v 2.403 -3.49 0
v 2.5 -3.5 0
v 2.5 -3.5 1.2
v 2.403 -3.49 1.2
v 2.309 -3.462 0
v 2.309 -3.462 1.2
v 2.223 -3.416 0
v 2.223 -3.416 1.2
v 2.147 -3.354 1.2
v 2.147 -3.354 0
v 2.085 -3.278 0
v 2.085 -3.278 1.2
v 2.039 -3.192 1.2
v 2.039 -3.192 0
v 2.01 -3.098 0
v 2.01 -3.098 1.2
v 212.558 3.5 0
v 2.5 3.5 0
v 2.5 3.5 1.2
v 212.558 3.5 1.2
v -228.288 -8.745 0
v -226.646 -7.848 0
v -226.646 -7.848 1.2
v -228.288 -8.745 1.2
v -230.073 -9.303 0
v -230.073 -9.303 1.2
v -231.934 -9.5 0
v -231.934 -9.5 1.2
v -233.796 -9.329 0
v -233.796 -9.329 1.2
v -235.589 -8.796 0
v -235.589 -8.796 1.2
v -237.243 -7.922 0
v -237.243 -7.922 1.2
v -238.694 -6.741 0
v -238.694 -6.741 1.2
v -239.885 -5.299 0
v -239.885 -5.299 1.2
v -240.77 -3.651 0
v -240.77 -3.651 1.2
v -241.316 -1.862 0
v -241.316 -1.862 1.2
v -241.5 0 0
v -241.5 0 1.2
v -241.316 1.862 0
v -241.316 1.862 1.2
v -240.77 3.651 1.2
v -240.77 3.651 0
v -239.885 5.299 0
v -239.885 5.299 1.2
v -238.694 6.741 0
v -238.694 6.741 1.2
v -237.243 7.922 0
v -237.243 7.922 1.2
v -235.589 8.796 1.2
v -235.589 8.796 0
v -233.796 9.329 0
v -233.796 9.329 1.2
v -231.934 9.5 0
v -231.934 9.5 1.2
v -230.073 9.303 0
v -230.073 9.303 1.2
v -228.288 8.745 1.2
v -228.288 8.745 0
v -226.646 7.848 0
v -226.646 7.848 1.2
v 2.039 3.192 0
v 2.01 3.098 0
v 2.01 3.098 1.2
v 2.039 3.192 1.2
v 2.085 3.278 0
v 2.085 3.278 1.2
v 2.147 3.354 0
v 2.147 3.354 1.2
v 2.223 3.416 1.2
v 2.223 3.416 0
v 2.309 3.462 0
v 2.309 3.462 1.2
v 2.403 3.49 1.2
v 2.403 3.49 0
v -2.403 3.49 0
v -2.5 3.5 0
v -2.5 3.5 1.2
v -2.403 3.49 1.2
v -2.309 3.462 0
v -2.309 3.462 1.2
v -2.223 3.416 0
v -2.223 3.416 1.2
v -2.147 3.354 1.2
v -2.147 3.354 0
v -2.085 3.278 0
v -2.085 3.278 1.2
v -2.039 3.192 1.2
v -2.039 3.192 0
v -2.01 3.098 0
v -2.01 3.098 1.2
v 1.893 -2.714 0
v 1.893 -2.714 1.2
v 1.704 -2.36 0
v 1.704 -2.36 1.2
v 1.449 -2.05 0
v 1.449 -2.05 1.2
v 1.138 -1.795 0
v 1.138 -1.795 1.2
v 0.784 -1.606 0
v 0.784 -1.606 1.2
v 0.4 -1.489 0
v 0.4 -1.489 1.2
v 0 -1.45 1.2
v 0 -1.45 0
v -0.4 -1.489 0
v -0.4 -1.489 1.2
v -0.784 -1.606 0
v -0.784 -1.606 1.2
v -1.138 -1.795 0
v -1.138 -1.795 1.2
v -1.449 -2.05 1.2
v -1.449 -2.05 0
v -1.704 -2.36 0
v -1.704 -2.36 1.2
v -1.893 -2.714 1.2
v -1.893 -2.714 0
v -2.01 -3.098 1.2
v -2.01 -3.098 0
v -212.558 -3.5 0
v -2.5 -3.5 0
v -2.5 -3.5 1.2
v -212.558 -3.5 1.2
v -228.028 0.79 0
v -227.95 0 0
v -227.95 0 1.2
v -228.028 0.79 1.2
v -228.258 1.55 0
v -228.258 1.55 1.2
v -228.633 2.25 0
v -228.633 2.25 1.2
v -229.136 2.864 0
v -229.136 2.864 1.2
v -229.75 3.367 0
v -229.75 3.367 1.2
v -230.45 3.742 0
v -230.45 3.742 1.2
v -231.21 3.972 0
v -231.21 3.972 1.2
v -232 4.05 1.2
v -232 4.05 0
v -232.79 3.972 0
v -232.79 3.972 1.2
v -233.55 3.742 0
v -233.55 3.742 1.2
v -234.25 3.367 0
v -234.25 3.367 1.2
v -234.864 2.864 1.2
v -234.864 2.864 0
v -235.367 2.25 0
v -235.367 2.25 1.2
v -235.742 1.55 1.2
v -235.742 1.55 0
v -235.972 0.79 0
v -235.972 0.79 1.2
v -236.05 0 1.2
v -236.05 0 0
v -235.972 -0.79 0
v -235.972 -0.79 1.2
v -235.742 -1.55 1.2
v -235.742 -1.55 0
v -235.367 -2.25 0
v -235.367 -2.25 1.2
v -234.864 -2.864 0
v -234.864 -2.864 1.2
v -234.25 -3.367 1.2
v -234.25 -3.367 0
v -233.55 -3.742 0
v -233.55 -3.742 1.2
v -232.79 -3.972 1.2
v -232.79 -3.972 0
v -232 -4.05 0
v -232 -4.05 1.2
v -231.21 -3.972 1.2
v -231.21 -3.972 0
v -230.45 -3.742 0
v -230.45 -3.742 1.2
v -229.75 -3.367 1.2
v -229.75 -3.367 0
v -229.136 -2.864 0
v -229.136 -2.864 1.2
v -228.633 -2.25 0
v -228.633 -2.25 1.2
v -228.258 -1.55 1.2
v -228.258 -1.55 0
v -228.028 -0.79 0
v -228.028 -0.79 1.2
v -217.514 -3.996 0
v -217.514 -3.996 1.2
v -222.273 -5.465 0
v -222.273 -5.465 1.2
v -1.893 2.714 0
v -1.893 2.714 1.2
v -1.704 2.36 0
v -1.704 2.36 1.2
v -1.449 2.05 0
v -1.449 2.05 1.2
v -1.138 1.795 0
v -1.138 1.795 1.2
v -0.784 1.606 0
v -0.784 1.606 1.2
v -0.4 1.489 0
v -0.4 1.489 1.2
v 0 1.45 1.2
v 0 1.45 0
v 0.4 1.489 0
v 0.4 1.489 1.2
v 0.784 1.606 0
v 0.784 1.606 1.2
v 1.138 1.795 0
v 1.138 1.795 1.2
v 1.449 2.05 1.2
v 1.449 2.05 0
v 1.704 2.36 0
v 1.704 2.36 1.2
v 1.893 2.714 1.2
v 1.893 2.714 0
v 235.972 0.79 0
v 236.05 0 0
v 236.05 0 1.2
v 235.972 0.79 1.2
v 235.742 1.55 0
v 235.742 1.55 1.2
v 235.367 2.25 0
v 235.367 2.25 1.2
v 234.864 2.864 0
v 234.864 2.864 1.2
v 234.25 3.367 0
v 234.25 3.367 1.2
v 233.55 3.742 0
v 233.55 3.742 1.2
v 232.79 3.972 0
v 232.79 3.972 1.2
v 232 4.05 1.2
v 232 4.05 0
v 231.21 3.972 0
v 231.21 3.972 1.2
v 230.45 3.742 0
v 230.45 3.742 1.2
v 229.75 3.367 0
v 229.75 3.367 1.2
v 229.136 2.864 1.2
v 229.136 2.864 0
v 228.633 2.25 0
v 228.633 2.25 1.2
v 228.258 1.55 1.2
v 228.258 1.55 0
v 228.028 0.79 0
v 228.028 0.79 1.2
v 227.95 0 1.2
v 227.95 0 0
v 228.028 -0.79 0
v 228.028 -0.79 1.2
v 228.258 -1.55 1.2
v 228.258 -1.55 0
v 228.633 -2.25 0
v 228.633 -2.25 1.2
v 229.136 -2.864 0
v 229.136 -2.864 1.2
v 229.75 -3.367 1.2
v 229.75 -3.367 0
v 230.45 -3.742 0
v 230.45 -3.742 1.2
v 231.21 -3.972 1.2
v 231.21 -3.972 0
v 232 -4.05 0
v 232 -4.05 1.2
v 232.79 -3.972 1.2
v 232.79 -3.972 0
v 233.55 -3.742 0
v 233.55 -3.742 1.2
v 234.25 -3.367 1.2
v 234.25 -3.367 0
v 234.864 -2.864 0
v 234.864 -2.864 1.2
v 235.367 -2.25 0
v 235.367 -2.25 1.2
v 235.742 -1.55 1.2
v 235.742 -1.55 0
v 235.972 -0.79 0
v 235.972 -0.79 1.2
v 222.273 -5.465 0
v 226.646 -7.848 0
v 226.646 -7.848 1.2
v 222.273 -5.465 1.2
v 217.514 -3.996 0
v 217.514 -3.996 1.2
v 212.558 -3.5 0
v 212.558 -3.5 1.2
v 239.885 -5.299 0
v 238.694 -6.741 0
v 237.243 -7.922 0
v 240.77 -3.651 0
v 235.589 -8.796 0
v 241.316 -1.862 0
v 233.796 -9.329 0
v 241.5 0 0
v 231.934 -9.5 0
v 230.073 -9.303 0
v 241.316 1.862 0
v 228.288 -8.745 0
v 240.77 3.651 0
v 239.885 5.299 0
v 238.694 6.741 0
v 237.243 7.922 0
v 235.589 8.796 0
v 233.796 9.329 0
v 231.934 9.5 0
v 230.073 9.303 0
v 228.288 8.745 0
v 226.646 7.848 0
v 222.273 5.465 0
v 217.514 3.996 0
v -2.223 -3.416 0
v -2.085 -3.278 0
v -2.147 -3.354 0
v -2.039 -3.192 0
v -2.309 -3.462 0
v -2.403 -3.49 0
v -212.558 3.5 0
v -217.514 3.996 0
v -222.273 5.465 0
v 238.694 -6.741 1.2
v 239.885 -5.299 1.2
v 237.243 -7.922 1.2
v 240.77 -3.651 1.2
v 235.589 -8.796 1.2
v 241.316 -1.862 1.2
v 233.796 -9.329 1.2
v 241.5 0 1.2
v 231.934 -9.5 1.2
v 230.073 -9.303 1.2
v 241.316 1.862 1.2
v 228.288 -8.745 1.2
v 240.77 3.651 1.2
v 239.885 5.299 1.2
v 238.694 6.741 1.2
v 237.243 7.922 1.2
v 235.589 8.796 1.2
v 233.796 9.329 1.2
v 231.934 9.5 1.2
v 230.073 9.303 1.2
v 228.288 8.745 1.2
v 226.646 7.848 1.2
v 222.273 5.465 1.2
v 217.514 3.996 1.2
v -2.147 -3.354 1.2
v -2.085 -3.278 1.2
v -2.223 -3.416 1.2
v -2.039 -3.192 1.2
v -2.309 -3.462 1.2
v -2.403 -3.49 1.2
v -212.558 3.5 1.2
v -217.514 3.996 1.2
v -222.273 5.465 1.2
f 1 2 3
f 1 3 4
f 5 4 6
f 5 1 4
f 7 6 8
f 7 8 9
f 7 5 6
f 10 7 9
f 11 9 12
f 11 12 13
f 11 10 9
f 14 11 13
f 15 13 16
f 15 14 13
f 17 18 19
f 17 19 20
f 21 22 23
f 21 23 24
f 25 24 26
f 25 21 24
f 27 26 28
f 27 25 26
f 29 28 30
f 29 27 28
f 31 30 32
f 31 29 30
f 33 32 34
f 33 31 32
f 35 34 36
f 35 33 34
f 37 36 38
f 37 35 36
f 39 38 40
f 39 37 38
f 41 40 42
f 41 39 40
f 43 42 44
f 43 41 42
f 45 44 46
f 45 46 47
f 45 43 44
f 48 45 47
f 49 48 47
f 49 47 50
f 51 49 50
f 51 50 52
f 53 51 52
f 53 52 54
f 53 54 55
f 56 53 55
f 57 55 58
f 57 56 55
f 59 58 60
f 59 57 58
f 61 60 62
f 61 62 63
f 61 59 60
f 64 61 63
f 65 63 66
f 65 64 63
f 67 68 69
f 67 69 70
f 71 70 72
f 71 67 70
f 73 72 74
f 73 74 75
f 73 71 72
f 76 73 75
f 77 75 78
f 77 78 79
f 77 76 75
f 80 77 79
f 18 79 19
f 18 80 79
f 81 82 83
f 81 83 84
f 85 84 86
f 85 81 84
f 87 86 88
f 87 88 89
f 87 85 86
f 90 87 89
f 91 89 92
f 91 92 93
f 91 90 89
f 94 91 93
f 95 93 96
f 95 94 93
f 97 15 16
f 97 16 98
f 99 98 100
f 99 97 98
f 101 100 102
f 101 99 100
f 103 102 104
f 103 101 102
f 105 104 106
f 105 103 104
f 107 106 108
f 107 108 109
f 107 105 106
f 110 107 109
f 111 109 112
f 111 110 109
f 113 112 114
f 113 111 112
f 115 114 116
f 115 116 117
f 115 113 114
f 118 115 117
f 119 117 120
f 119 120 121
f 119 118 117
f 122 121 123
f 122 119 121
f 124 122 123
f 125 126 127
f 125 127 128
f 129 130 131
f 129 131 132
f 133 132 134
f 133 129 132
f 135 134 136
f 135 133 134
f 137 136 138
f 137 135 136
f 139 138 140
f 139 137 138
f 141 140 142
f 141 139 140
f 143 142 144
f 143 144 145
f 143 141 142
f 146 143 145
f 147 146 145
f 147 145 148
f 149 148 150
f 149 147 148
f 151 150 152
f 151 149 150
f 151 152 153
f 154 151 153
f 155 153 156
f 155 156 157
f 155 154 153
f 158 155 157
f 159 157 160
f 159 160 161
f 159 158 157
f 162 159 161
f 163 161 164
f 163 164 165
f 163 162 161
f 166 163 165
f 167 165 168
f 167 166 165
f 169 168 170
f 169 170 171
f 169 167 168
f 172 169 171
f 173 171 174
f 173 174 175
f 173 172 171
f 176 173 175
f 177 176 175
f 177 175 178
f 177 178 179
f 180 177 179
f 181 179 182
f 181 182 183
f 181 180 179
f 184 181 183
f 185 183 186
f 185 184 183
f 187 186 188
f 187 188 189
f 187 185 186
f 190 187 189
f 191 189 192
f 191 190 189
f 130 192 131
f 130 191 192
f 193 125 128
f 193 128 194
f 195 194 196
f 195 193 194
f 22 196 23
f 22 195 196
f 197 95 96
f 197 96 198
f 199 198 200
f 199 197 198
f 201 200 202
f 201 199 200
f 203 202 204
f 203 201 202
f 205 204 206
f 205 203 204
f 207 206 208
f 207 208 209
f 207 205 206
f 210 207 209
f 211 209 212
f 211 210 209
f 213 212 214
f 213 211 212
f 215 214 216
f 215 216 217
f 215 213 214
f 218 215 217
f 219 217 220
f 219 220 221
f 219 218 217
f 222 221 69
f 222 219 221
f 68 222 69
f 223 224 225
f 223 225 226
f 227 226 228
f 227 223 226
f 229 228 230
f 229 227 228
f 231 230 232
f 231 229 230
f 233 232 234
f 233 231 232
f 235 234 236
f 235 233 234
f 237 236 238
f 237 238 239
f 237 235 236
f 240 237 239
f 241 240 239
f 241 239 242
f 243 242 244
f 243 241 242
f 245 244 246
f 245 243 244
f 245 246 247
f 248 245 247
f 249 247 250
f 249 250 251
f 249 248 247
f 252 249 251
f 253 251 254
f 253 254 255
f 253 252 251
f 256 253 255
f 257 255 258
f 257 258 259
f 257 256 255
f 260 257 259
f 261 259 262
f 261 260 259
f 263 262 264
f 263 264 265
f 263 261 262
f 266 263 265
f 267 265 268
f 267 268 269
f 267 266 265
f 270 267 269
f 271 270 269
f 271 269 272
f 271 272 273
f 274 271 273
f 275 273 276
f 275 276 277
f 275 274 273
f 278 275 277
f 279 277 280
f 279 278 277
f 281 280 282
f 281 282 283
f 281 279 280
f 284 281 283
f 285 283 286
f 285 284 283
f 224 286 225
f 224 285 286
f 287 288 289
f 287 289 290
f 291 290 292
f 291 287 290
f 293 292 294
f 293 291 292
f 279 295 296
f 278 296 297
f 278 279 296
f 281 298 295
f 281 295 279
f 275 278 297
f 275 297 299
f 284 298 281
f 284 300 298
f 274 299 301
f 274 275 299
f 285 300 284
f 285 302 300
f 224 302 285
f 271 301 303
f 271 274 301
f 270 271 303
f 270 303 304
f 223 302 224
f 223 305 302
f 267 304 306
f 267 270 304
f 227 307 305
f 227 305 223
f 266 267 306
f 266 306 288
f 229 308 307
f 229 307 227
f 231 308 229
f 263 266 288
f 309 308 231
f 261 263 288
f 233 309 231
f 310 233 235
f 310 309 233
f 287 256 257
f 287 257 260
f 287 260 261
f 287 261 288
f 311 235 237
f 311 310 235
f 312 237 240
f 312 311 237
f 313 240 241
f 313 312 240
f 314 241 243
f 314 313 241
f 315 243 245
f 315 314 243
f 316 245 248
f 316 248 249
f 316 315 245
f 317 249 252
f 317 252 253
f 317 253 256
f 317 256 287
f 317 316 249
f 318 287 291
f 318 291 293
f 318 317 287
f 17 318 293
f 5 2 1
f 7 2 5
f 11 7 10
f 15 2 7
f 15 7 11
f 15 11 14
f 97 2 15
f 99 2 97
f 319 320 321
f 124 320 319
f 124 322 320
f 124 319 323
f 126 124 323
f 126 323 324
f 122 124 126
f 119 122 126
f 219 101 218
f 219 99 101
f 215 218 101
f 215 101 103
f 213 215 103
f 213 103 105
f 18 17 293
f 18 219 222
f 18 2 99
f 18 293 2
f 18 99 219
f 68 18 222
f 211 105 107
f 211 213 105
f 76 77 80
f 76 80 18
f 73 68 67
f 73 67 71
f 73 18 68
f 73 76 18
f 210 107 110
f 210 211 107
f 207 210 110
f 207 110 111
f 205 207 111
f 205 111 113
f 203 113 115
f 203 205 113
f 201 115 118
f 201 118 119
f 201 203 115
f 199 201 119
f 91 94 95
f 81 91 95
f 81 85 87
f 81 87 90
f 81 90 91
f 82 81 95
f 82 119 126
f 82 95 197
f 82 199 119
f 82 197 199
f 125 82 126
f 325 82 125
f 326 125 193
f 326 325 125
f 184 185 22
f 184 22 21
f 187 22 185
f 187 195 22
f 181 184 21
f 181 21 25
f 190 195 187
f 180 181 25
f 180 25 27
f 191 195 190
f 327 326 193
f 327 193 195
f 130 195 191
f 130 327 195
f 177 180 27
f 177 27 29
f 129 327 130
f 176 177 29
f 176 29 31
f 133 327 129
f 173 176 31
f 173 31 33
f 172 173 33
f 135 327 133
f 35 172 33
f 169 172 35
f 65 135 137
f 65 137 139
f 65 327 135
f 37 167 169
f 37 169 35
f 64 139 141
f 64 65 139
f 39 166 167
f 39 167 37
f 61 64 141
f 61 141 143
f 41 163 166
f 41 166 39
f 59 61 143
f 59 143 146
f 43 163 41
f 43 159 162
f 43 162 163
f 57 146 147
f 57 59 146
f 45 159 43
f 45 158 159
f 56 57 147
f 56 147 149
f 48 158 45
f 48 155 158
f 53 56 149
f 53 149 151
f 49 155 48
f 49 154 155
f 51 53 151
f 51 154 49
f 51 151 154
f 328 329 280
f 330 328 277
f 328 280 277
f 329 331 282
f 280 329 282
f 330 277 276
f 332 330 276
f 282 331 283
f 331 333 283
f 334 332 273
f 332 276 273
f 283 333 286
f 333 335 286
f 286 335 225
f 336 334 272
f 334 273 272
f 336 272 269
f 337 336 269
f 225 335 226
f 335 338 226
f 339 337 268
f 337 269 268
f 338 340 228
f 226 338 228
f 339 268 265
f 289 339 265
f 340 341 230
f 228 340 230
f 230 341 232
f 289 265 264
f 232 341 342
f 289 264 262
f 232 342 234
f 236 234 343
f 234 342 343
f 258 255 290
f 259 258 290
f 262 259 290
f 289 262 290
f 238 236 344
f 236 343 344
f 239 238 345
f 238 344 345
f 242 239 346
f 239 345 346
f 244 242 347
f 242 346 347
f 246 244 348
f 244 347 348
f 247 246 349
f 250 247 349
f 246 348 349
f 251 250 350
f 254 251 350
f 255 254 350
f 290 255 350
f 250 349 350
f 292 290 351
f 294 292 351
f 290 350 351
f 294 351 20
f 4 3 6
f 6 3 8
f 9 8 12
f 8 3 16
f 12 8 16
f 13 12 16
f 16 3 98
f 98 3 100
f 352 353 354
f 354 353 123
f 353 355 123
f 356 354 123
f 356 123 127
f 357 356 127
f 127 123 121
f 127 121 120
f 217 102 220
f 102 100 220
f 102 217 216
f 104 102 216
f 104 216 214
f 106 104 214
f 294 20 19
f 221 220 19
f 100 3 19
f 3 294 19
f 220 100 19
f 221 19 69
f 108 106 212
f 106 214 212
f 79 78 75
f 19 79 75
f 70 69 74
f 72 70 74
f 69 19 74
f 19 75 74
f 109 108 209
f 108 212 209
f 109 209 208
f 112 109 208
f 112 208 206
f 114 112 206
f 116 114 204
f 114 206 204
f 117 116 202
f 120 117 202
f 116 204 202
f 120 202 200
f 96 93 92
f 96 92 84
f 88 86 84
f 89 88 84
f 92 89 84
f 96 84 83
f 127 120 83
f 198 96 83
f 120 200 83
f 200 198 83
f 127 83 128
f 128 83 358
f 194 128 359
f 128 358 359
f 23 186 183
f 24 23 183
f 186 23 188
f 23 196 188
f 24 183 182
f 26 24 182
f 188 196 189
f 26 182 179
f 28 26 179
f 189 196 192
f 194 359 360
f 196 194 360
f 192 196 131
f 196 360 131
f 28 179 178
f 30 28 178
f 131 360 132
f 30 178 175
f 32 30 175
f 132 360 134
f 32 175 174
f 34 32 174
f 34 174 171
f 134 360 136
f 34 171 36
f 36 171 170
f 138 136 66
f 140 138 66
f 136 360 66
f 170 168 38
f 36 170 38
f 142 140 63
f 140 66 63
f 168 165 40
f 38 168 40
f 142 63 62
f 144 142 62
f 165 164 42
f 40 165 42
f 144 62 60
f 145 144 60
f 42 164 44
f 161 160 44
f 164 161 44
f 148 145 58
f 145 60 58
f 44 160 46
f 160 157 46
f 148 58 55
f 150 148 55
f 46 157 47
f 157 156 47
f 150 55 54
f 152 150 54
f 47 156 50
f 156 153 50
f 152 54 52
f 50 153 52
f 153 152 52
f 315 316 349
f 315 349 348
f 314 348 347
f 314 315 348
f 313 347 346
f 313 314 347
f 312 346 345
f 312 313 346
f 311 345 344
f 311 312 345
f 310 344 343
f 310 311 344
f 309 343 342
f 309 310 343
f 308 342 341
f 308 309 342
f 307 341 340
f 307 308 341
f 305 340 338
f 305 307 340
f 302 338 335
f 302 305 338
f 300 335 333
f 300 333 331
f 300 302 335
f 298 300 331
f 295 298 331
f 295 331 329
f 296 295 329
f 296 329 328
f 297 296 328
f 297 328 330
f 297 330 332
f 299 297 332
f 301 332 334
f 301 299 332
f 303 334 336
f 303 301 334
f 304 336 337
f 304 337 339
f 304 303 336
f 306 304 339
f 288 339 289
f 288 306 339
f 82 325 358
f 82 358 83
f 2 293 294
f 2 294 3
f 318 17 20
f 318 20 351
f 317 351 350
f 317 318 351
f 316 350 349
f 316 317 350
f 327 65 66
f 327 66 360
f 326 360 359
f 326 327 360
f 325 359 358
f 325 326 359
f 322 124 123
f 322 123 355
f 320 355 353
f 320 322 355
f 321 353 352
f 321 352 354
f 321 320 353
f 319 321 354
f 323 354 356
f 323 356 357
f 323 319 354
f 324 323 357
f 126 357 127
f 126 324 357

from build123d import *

# Parameters (mm, degrees)
SKETCH1_R           = 4.05
BOSS_EXTRUDE1_DEPTH = 1.2


with BuildPart() as part:
    # Sketch1 → Boss-Extrude1 (new body)
    with BuildSketch(Plane.XY):
        with BuildLine():
            Line((2.50049995, 3.5), (212.557777905, 3.5))
            ThreePointArc((212.557777905, 3.5), (219.929875713, 4.611672852), (226.64634464, 7.847826087))
            ThreePointArc((226.64634464, 7.847826087), (241.5, 0), (226.64634464, -7.847826087))
            ThreePointArc((226.64634464, -7.847826087), (219.929875713, -4.611672852), (212.557777905, -3.5))
            Line((212.557777905, -3.5), (2.50049995, -3.5))
            ThreePointArc((2.50049995, -3.5), (2.183498063, -3.386664976), (2.010205842, -3.098039216))
            ThreePointArc((2.010205842, -3.098039216), (0, -1.45), (-2.010205842, -3.098039216))
            ThreePointArc((-2.010205842, -3.098039216), (-2.183498063, -3.386664976), (-2.50049995, -3.5))
            Line((-2.50049995, -3.5), (-212.557777905, -3.5))
            ThreePointArc((-212.557777905, -3.5), (-219.929875713, -4.611672852), (-226.64634464, -7.847826087))
            ThreePointArc((-226.64634464, -7.847826087), (-241.5, 0), (-226.64634464, 7.847826087))
            ThreePointArc((-226.64634464, 7.847826087), (-219.929875713, 4.611672852), (-212.557777905, 3.5))
            Line((-212.557777905, 3.5), (-2.50049995, 3.5))
            ThreePointArc((-2.50049995, 3.5), (-2.183498063, 3.386664976), (-2.010205842, 3.098039216))
            ThreePointArc((-2.010205842, 3.098039216), (0, 1.45), (2.010205842, 3.098039216))
            ThreePointArc((2.010205842, 3.098039216), (2.183498063, 3.386664976), (2.50049995, 3.5))
        make_face()
        with Locations((232, 0)):
            Circle(SKETCH1_R, mode=Mode.SUBTRACT)
        with Locations((-232, 0)):
            Circle(SKETCH1_R, mode=Mode.SUBTRACT)
    extrude(amount=BOSS_EXTRUDE1_DEPTH)


solid = part.part
